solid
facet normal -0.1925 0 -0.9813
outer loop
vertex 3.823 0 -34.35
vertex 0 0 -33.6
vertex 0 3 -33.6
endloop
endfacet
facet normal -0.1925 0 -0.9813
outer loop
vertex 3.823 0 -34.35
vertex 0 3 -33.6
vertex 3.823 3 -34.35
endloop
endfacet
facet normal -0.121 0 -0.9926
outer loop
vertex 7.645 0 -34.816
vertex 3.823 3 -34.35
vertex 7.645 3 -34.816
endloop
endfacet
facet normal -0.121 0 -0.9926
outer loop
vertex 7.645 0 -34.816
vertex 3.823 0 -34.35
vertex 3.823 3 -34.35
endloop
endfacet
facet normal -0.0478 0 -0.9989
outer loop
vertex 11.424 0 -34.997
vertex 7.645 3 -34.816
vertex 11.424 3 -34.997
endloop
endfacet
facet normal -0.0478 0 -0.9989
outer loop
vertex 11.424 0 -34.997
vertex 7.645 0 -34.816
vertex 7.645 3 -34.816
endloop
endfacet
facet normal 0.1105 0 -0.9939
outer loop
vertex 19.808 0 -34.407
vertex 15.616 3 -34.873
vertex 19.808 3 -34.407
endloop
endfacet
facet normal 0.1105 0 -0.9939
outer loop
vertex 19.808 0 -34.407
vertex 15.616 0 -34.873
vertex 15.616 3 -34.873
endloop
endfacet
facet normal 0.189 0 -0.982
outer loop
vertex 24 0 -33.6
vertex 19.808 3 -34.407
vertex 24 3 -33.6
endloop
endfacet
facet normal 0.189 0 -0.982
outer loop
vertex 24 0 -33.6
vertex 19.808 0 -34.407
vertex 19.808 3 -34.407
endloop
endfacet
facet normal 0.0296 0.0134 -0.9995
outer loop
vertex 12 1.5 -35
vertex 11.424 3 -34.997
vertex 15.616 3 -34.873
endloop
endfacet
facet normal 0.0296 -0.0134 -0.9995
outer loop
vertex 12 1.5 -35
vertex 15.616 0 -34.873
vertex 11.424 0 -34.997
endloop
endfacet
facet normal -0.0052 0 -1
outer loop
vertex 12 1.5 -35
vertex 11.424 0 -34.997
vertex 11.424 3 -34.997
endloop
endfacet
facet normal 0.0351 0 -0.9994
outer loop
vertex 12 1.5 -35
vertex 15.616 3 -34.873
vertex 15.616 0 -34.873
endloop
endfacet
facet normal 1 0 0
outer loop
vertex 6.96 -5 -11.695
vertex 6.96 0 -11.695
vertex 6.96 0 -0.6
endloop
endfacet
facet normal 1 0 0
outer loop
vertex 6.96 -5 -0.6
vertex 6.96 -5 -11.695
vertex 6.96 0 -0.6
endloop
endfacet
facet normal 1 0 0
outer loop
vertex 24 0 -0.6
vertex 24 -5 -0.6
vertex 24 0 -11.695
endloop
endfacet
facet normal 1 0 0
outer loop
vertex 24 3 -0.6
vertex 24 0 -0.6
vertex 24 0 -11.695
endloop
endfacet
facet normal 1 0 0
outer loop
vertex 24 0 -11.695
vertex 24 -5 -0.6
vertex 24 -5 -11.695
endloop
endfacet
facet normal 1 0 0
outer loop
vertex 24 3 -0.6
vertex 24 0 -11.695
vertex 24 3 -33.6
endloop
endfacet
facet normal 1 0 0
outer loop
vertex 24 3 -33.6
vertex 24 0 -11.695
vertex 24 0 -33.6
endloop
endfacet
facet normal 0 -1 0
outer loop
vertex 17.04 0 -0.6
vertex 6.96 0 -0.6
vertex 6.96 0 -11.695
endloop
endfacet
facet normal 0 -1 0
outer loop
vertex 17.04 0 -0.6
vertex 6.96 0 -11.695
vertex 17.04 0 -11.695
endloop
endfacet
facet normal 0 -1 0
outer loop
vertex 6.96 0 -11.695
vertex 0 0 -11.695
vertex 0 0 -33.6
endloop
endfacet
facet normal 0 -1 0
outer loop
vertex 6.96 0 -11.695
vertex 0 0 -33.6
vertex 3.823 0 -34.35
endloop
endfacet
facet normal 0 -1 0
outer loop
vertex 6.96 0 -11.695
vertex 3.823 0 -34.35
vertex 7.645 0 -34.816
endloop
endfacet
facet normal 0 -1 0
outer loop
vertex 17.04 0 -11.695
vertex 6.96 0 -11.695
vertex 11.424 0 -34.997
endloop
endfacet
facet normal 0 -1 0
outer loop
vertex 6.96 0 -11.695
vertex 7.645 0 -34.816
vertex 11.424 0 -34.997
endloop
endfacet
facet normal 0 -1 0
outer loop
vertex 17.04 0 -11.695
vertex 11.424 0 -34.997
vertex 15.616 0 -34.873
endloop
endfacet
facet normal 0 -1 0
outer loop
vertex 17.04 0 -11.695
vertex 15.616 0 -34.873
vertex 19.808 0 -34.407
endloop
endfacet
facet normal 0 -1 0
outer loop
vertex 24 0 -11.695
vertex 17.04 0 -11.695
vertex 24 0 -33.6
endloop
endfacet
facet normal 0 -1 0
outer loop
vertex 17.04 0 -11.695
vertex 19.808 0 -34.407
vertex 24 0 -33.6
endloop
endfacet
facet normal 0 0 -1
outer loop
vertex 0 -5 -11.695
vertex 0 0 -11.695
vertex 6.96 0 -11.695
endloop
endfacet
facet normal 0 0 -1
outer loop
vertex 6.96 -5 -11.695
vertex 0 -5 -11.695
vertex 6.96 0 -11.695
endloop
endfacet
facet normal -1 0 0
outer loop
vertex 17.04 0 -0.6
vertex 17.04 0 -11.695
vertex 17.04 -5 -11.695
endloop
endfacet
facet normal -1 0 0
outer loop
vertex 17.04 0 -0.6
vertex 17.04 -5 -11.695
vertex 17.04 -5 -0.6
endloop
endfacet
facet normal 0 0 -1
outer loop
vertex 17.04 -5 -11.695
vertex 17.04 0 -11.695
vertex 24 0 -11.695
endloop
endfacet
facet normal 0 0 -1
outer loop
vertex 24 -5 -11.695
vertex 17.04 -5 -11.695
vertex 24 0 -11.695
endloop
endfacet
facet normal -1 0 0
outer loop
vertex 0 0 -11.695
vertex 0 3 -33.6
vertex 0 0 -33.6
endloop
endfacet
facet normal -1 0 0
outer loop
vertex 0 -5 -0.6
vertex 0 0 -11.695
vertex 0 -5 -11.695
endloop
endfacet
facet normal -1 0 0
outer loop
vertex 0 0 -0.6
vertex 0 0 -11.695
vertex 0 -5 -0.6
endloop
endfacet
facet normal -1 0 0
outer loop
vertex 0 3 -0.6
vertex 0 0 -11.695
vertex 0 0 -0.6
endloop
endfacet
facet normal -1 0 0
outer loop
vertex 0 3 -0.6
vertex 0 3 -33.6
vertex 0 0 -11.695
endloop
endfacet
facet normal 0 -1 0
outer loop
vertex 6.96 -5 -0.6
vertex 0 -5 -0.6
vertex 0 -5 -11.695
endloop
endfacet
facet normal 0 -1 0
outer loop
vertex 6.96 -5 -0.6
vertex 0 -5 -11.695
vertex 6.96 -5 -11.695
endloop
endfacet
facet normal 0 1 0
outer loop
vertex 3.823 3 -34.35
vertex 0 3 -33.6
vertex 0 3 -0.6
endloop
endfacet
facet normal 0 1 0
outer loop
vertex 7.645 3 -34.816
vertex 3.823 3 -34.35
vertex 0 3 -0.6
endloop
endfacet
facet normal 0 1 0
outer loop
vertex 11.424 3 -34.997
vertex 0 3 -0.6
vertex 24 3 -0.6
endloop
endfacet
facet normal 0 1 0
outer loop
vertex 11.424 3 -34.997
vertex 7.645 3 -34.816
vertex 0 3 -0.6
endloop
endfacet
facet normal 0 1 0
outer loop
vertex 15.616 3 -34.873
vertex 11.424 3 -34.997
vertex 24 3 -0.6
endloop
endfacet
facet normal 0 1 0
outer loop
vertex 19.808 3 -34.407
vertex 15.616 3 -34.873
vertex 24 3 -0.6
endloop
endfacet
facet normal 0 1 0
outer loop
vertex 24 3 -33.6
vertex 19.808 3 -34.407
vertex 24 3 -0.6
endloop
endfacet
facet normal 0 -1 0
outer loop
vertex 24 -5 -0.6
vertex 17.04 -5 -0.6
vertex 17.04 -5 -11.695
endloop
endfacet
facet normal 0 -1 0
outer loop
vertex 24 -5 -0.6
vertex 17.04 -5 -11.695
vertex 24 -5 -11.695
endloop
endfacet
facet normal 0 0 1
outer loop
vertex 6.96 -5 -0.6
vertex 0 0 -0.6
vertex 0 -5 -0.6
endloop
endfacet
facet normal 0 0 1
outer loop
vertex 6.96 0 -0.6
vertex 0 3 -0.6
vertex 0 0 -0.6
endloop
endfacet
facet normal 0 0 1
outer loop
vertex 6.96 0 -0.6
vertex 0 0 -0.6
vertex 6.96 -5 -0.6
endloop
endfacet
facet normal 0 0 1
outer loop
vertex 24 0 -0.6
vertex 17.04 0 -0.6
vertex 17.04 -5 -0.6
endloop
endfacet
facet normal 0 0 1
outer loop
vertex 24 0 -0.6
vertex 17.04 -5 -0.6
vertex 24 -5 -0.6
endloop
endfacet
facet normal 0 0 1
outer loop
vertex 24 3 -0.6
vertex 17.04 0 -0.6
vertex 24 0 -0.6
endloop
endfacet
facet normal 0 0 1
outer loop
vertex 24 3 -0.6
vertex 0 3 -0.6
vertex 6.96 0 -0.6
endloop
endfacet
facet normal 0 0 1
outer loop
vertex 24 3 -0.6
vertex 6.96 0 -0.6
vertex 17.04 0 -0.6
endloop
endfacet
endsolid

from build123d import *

# Parameters (mm, degrees)
BOSS_EXTRUDE1_DEPTH = 3
SKETCH4_W           = 24
SKETCH4_H           = 0.6
CUT_EXTRUDE3_DEPTH  = 4.0000001
SKETCH5_W           = 6.959988298
SKETCH5_H           = 11.094755151
BOSS_EXTRUDE2_DEPTH = 5


with BuildPart() as part:
    # Sketch1 → Boss-Extrude1 (new body)
    with BuildSketch(Plane(origin=(0, 0, 0), x_dir=(1, 0, 0), z_dir=(0, 1, 0))):
        with BuildLine():
            Line((0, 0), (24, 0))
            Line((24, 0), (24, 33.6))
            add(Edge.make_bspline(
                [(0, 33.6), (12, 36.4), (24, 33.6)],
                knots=[0, 0, 0, 1, 1, 1], degree=2))
            Line((0, 33.6), (0, 0))
        make_face()
    extrude(amount=BOSS_EXTRUDE1_DEPTH)

    # Sketch4 → Cut-Extrude3 (cut, through all)
    with BuildSketch(Plane(origin=(0, 3, 0), x_dir=(1, 0, 0), z_dir=(0, 1, 0))):
        with Locations((12, 0.3)):
            Rectangle(SKETCH4_W, SKETCH4_H)
    extrude(amount=-CUT_EXTRUDE3_DEPTH, mode=Mode.SUBTRACT)

    # Sketch5 → Boss-Extrude2 (add)
    with BuildSketch(Plane.XZ):
        with Locations((3.479994149, -6.147377576)):
            Rectangle(SKETCH5_W, SKETCH5_H)
        with Locations((20.520005851, -6.147377576)):
            Rectangle(SKETCH5_W, SKETCH5_H)
    extrude(amount=BOSS_EXTRUDE2_DEPTH)


solid = part.part
